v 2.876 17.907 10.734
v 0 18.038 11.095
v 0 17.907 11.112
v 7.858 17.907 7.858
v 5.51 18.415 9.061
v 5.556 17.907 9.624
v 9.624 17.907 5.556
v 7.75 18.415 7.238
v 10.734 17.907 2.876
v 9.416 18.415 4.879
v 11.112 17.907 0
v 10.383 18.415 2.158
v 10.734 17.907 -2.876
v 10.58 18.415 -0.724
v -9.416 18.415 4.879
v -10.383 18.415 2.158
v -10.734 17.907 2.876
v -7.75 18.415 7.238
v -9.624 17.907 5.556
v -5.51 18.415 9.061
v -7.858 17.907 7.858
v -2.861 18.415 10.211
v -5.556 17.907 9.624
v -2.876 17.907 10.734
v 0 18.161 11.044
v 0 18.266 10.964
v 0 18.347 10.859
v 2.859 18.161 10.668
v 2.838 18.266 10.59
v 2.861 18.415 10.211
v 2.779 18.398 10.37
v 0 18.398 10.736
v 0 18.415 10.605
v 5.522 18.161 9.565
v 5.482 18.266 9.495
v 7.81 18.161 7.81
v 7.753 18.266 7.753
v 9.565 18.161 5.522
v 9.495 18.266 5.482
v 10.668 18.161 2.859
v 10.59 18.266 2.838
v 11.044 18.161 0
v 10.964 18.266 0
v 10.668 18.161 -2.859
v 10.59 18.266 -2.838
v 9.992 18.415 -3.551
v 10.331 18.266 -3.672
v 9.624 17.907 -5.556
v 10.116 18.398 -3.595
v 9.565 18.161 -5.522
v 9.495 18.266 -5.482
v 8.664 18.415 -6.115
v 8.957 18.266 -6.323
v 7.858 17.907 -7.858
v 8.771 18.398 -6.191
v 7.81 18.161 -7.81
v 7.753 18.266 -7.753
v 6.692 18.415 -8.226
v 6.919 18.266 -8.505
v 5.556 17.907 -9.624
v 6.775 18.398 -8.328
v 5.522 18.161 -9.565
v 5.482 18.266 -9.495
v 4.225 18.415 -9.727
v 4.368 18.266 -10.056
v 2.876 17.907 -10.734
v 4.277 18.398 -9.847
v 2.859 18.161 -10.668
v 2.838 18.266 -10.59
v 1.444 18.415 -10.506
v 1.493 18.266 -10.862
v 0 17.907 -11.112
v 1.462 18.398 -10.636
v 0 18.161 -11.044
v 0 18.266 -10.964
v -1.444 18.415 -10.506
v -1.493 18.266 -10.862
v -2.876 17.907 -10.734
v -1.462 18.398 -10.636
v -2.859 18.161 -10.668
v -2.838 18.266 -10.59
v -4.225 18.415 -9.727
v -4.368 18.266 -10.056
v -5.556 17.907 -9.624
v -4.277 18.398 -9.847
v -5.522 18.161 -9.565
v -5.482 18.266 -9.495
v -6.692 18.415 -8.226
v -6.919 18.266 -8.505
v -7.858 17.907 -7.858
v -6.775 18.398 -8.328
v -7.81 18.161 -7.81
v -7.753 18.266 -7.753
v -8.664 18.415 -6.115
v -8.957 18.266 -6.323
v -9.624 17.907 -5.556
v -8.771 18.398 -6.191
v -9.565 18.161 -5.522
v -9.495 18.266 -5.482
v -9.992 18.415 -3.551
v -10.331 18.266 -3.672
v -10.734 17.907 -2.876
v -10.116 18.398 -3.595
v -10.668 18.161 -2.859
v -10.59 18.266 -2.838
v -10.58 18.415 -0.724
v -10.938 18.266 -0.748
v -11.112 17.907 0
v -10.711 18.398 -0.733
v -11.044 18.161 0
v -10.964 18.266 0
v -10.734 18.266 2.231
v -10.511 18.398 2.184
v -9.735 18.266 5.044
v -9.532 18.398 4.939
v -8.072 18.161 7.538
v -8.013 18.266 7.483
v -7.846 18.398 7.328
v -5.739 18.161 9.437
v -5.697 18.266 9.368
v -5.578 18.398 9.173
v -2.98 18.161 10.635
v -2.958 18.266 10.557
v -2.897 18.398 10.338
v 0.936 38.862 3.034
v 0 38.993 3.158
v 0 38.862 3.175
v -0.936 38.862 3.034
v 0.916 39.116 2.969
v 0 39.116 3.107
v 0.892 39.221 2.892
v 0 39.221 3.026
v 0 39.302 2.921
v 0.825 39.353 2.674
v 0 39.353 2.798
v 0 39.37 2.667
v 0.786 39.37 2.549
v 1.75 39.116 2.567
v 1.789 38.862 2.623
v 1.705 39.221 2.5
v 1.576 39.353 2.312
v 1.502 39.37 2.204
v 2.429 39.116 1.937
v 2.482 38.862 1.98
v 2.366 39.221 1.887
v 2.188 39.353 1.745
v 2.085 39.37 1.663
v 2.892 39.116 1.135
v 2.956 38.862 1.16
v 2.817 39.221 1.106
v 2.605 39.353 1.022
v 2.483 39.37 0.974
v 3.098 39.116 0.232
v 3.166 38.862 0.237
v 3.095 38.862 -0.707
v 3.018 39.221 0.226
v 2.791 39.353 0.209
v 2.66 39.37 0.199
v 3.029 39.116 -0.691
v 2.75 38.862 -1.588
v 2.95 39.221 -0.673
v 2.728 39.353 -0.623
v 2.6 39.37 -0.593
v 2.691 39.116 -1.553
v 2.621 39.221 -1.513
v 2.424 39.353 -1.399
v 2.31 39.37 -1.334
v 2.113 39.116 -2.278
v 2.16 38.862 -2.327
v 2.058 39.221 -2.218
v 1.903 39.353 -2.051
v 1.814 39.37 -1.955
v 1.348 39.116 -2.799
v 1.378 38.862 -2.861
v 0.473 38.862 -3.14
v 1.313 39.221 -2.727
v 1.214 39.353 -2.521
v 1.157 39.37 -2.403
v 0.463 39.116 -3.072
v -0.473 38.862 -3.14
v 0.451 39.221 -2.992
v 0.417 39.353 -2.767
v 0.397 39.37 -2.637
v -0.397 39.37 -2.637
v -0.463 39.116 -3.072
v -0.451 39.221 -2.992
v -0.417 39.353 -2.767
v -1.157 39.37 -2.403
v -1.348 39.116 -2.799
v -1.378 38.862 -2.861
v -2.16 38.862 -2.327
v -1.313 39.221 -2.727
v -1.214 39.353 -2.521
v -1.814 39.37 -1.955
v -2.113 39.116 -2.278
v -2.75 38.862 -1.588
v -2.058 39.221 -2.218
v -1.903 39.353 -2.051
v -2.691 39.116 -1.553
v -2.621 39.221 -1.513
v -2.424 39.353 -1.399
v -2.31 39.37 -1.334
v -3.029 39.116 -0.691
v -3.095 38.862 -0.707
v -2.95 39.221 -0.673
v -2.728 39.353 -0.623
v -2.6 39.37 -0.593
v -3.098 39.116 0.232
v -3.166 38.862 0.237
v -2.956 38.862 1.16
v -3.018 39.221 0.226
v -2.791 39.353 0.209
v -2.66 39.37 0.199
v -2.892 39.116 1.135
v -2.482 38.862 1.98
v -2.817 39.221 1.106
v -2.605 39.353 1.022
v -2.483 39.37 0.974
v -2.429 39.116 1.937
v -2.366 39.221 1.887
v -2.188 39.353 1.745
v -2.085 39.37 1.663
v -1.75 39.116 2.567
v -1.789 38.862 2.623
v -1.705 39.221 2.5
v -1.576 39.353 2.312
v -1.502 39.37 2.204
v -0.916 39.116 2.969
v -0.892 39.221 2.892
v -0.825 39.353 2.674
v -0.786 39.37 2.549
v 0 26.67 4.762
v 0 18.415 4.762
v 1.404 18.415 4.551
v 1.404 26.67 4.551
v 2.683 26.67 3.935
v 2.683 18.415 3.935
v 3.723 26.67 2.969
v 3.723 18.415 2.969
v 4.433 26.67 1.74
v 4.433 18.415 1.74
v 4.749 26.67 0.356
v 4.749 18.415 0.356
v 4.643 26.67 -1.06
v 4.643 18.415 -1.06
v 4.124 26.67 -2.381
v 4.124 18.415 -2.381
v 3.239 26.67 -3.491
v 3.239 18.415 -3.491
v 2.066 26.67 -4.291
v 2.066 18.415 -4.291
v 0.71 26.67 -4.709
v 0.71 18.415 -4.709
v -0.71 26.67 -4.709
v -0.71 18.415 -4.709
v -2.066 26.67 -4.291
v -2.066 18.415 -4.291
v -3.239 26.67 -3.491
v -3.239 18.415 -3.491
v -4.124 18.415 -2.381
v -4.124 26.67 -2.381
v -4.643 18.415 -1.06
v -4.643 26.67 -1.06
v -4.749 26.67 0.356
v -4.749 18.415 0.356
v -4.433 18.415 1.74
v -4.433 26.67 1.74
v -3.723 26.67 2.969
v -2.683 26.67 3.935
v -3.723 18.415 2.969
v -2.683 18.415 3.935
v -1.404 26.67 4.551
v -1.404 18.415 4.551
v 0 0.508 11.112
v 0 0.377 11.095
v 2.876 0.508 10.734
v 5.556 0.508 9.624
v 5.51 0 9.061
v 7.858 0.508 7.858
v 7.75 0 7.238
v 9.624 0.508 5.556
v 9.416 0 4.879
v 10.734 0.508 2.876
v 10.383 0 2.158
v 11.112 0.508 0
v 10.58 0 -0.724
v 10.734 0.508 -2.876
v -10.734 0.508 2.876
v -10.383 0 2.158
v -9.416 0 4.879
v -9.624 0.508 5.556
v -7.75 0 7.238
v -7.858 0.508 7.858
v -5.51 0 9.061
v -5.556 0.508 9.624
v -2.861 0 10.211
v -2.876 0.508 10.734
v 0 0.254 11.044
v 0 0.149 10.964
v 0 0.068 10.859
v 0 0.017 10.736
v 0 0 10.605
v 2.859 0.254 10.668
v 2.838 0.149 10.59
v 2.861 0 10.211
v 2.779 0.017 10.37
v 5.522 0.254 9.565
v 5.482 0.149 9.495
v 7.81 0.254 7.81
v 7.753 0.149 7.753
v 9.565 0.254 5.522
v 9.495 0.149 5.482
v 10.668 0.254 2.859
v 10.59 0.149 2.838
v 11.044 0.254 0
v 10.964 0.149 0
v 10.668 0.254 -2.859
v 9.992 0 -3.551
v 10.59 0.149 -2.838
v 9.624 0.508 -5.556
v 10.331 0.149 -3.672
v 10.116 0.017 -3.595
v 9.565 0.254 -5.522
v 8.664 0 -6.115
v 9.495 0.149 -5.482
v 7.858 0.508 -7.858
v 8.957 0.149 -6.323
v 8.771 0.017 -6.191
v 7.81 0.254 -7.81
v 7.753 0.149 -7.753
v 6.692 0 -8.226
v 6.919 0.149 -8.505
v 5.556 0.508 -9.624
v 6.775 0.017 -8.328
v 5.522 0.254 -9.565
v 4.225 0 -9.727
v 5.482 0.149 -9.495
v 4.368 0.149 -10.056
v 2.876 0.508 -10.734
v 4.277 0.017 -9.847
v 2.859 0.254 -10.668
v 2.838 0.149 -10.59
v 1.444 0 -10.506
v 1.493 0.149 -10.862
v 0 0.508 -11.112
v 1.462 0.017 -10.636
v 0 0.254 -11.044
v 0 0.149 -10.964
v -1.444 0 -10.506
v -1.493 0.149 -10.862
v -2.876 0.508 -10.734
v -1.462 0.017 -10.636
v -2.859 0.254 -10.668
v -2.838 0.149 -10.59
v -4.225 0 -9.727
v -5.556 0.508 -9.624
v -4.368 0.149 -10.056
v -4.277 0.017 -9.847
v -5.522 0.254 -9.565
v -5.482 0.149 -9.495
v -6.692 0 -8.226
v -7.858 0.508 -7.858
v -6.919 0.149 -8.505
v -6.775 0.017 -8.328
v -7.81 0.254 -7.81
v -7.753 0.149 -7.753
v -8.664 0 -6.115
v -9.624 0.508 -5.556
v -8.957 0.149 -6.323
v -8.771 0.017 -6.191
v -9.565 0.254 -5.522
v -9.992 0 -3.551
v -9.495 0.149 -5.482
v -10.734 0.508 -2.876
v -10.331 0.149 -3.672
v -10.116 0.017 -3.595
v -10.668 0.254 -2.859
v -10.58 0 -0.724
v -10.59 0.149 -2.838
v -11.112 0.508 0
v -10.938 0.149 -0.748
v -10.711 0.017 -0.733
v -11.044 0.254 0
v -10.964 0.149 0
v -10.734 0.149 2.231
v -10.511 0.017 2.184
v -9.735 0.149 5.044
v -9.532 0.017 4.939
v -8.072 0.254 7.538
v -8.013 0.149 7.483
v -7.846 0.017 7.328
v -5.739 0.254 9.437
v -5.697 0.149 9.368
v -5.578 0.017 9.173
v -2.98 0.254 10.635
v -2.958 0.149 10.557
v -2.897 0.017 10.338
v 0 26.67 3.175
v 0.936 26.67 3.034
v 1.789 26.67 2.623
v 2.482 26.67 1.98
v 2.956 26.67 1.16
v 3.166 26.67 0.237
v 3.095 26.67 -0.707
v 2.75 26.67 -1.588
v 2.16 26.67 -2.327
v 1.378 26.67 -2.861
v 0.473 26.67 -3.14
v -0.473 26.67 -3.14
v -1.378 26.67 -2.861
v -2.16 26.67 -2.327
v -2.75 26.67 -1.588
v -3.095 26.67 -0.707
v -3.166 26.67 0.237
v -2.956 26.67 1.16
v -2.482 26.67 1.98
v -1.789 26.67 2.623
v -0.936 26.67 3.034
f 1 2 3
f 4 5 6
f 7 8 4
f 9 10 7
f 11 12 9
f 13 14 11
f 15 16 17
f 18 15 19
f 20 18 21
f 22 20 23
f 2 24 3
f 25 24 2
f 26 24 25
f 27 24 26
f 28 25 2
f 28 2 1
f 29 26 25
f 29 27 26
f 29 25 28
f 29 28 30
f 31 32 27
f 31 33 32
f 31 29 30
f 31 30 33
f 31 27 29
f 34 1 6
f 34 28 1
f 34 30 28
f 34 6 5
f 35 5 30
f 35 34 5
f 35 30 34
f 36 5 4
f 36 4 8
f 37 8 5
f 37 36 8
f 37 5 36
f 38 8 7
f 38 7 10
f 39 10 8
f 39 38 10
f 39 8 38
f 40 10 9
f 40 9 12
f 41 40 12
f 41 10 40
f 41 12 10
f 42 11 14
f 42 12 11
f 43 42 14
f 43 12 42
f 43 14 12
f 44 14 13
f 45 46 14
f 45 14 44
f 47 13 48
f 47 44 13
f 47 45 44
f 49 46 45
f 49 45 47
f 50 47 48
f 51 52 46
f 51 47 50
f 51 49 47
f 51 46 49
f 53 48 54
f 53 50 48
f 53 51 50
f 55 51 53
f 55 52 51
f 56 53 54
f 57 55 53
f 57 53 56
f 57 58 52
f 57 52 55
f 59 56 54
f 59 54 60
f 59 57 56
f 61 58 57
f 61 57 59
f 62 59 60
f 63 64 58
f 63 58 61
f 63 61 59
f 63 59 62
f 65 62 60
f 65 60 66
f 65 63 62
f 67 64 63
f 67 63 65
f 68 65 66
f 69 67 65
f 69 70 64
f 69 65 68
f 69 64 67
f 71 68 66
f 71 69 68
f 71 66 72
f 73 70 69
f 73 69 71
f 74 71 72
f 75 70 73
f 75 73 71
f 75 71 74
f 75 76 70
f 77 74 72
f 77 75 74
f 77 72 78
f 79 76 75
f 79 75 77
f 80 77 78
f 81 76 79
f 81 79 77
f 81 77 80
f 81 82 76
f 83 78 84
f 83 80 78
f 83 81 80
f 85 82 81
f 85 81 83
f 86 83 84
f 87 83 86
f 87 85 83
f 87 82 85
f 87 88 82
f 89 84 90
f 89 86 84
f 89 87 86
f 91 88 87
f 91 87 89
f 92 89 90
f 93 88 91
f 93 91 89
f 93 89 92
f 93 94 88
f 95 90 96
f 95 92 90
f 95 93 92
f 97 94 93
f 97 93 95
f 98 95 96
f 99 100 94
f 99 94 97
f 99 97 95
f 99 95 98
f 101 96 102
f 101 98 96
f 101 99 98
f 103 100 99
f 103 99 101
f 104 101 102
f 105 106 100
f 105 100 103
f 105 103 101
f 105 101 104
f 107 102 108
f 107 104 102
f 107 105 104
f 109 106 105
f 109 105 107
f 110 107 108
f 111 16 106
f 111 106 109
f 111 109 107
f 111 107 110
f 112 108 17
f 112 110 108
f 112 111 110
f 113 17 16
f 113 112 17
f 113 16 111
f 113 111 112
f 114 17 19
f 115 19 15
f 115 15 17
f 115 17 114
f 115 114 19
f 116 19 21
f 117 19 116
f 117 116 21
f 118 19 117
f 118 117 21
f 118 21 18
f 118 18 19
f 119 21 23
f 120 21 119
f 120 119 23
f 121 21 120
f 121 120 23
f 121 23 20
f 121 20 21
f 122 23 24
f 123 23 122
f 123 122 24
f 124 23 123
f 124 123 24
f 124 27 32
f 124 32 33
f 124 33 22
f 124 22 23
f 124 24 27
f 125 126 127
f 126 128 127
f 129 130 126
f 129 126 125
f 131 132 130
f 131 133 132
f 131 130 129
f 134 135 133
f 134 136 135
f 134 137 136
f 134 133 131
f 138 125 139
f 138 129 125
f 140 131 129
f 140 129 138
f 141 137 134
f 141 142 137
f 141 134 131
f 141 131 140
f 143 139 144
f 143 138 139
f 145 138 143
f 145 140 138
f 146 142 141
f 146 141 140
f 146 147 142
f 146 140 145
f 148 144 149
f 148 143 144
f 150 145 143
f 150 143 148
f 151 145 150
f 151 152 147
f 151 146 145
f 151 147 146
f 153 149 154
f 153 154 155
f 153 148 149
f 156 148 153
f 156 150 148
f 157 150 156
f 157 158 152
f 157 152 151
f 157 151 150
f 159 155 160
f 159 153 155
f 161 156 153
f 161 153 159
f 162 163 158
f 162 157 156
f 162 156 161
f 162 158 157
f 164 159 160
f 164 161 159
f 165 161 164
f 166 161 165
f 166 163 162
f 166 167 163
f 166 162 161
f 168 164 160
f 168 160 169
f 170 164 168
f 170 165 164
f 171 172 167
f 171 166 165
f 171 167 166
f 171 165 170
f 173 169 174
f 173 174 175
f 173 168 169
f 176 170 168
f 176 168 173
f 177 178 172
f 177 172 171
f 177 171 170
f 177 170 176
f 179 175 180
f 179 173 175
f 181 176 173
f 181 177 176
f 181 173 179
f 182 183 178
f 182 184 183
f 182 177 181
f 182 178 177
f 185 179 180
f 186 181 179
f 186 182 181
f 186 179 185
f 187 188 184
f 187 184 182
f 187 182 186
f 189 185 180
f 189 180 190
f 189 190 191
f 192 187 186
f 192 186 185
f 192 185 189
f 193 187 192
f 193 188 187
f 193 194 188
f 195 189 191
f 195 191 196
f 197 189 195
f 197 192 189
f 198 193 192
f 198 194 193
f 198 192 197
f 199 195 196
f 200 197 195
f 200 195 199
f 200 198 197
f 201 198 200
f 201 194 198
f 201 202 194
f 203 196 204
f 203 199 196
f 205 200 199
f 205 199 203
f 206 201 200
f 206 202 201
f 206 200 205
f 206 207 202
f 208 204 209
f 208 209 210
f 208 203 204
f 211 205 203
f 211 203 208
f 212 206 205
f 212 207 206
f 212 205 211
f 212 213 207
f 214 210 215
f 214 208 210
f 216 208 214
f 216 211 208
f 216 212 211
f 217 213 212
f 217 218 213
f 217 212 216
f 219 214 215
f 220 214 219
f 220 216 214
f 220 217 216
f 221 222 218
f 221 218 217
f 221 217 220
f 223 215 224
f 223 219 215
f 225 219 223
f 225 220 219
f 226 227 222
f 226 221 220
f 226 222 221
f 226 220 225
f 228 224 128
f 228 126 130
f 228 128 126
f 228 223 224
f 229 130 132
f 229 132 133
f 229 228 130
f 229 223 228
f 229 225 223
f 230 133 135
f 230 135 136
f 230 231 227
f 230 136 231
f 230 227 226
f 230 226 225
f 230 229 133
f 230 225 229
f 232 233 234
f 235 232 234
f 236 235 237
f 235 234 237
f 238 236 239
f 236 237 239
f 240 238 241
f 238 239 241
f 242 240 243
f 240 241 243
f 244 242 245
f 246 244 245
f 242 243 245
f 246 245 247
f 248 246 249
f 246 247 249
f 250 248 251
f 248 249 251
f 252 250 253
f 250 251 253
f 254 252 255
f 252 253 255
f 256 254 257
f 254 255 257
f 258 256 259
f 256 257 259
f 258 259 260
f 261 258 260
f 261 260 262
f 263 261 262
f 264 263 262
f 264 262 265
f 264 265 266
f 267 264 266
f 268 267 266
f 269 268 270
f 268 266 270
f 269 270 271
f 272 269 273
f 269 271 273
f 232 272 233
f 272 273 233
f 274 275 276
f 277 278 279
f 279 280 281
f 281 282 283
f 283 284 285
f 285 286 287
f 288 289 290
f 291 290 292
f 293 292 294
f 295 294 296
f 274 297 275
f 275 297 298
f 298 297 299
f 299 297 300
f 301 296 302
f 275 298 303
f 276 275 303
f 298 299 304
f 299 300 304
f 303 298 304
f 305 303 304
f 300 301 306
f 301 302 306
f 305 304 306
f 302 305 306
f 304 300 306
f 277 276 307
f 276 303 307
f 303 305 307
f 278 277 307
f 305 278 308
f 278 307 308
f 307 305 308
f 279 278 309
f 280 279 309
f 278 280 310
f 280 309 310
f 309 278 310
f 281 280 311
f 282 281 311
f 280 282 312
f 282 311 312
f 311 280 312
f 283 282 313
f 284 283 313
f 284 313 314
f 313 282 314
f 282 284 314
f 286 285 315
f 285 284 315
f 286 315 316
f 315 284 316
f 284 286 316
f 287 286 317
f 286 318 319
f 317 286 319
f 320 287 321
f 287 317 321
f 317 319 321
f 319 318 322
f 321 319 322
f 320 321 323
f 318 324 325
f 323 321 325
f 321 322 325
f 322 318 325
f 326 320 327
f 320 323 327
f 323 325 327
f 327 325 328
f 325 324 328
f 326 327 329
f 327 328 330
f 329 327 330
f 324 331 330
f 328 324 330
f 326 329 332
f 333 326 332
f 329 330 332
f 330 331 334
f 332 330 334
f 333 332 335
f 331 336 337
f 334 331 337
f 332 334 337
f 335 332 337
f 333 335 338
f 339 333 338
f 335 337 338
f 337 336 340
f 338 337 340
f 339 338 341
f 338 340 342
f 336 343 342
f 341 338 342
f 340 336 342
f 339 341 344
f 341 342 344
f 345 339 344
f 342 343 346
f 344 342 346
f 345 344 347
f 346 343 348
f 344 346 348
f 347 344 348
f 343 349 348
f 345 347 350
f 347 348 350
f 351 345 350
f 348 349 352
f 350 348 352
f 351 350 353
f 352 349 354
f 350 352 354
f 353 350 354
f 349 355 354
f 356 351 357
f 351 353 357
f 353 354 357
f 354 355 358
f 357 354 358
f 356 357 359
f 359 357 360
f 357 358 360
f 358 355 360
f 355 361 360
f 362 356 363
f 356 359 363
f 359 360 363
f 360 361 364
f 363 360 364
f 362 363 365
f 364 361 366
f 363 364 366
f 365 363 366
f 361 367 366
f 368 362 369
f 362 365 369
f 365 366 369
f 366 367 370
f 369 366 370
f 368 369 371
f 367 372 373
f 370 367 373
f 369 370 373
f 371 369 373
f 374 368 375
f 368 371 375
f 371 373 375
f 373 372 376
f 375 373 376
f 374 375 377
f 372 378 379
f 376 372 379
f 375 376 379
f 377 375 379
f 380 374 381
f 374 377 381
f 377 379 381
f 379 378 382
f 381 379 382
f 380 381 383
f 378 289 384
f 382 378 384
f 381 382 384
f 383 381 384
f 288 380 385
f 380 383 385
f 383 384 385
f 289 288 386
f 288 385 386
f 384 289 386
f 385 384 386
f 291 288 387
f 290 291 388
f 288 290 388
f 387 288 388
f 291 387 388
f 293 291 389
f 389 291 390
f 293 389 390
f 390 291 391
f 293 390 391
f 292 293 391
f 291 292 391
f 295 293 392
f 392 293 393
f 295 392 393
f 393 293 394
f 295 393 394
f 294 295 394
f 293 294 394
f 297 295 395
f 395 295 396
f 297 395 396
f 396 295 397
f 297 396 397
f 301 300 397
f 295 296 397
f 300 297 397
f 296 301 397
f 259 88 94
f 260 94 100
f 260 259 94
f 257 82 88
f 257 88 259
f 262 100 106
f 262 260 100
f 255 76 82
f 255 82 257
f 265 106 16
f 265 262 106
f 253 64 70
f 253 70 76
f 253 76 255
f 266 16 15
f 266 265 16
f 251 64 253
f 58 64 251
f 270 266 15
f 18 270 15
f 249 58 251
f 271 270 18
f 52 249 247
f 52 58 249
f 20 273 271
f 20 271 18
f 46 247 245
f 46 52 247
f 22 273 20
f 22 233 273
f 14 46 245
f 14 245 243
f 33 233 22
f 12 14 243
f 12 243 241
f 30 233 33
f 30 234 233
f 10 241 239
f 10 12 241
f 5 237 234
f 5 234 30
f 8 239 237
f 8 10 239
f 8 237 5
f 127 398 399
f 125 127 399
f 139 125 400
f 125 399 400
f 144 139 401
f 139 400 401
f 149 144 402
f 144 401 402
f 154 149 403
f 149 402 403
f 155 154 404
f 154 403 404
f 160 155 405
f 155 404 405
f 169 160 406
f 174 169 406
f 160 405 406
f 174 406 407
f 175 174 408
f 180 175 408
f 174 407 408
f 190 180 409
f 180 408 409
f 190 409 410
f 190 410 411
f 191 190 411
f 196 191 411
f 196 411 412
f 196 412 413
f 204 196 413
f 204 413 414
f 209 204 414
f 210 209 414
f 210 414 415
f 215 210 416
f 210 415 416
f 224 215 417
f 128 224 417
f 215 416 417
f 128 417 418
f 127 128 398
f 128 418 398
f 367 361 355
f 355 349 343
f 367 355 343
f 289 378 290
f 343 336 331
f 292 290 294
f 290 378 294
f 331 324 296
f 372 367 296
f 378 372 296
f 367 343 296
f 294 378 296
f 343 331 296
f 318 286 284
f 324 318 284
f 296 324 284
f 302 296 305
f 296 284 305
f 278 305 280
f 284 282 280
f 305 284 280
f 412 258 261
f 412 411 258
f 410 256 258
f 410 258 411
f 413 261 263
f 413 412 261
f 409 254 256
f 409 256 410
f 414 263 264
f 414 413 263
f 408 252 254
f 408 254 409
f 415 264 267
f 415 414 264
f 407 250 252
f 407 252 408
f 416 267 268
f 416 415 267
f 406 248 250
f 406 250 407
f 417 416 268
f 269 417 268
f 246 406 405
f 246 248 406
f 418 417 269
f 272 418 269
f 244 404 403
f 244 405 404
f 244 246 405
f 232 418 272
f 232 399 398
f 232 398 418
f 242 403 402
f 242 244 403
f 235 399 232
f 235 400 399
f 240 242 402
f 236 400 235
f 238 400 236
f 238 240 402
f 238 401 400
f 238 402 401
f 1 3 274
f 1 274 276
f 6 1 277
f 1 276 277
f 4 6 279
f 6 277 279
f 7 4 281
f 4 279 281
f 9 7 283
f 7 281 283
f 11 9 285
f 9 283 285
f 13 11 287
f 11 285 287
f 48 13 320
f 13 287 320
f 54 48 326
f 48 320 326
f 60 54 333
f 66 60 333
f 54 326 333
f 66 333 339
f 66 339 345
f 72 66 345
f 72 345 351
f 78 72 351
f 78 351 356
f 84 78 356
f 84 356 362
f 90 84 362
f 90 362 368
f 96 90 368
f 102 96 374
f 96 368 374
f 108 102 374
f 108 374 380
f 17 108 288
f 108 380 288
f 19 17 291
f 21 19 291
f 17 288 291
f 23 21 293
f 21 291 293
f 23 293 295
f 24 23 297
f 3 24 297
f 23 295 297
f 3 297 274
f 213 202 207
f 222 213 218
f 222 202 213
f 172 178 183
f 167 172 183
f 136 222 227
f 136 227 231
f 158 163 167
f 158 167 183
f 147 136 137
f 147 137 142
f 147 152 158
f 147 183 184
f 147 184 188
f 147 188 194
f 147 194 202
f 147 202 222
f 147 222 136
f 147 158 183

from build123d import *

# Parameters (mm, degrees)
SKETCH1_R           = 11.1125
BOSS_EXTRUDE1_DEPTH = 18.415
SKETCH2_R           = 4.7625
BOSS_EXTRUDE2_DEPTH = 8.255
SKETCH3_R           = 3.175
BOSS_EXTRUDE3_DEPTH = 12.7
FILLET1_R           = 0.508
FILLET2_R           = 0.508


with BuildPart() as part:
    # Sketch1 → Boss-Extrude1 (new body)
    with BuildSketch(Plane(origin=(0, 0, 0), x_dir=(1, 0, 0), z_dir=(0, 1, 0))):
        with Locations(Location((0, 0, 0), (0, 0, 270))):
            Circle(SKETCH1_R)
    extrude(amount=BOSS_EXTRUDE1_DEPTH)

    # Sketch2 → Boss-Extrude2 (add)
    with BuildSketch(Plane(origin=(0, 18.415, 0), x_dir=(1, 0, 0), z_dir=(0, 1, 0))):
        with Locations(Location((0, 0, 0), (0, 0, 270))):
            Circle(SKETCH2_R)
    extrude(amount=BOSS_EXTRUDE2_DEPTH)

    # Sketch3 → Boss-Extrude3 (add)
    with BuildSketch(Plane(origin=(0, 26.67, 0), x_dir=(1, 0, 0), z_dir=(0, 1, 0))):
        with Locations(Location((0, 0, 0), (0, 0, 270))):
            Circle(SKETCH3_R)
    extrude(amount=BOSS_EXTRUDE3_DEPTH)

    # Fillet1
    fillet1_edges = [part.edges().sort_by_distance(p)[0] for p in [
        (0, 0, -11.1125),
        (0, 18.415, -11.1125),
    ]]
    fillet(fillet1_edges, radius=FILLET1_R)

    # Fillet2
    fillet2_edges = [part.edges().sort_by_distance(p)[0] for p in [
        (0, 39.37, -3.175),
    ]]
    fillet(fillet2_edges, radius=FILLET2_R)


solid = part.part
